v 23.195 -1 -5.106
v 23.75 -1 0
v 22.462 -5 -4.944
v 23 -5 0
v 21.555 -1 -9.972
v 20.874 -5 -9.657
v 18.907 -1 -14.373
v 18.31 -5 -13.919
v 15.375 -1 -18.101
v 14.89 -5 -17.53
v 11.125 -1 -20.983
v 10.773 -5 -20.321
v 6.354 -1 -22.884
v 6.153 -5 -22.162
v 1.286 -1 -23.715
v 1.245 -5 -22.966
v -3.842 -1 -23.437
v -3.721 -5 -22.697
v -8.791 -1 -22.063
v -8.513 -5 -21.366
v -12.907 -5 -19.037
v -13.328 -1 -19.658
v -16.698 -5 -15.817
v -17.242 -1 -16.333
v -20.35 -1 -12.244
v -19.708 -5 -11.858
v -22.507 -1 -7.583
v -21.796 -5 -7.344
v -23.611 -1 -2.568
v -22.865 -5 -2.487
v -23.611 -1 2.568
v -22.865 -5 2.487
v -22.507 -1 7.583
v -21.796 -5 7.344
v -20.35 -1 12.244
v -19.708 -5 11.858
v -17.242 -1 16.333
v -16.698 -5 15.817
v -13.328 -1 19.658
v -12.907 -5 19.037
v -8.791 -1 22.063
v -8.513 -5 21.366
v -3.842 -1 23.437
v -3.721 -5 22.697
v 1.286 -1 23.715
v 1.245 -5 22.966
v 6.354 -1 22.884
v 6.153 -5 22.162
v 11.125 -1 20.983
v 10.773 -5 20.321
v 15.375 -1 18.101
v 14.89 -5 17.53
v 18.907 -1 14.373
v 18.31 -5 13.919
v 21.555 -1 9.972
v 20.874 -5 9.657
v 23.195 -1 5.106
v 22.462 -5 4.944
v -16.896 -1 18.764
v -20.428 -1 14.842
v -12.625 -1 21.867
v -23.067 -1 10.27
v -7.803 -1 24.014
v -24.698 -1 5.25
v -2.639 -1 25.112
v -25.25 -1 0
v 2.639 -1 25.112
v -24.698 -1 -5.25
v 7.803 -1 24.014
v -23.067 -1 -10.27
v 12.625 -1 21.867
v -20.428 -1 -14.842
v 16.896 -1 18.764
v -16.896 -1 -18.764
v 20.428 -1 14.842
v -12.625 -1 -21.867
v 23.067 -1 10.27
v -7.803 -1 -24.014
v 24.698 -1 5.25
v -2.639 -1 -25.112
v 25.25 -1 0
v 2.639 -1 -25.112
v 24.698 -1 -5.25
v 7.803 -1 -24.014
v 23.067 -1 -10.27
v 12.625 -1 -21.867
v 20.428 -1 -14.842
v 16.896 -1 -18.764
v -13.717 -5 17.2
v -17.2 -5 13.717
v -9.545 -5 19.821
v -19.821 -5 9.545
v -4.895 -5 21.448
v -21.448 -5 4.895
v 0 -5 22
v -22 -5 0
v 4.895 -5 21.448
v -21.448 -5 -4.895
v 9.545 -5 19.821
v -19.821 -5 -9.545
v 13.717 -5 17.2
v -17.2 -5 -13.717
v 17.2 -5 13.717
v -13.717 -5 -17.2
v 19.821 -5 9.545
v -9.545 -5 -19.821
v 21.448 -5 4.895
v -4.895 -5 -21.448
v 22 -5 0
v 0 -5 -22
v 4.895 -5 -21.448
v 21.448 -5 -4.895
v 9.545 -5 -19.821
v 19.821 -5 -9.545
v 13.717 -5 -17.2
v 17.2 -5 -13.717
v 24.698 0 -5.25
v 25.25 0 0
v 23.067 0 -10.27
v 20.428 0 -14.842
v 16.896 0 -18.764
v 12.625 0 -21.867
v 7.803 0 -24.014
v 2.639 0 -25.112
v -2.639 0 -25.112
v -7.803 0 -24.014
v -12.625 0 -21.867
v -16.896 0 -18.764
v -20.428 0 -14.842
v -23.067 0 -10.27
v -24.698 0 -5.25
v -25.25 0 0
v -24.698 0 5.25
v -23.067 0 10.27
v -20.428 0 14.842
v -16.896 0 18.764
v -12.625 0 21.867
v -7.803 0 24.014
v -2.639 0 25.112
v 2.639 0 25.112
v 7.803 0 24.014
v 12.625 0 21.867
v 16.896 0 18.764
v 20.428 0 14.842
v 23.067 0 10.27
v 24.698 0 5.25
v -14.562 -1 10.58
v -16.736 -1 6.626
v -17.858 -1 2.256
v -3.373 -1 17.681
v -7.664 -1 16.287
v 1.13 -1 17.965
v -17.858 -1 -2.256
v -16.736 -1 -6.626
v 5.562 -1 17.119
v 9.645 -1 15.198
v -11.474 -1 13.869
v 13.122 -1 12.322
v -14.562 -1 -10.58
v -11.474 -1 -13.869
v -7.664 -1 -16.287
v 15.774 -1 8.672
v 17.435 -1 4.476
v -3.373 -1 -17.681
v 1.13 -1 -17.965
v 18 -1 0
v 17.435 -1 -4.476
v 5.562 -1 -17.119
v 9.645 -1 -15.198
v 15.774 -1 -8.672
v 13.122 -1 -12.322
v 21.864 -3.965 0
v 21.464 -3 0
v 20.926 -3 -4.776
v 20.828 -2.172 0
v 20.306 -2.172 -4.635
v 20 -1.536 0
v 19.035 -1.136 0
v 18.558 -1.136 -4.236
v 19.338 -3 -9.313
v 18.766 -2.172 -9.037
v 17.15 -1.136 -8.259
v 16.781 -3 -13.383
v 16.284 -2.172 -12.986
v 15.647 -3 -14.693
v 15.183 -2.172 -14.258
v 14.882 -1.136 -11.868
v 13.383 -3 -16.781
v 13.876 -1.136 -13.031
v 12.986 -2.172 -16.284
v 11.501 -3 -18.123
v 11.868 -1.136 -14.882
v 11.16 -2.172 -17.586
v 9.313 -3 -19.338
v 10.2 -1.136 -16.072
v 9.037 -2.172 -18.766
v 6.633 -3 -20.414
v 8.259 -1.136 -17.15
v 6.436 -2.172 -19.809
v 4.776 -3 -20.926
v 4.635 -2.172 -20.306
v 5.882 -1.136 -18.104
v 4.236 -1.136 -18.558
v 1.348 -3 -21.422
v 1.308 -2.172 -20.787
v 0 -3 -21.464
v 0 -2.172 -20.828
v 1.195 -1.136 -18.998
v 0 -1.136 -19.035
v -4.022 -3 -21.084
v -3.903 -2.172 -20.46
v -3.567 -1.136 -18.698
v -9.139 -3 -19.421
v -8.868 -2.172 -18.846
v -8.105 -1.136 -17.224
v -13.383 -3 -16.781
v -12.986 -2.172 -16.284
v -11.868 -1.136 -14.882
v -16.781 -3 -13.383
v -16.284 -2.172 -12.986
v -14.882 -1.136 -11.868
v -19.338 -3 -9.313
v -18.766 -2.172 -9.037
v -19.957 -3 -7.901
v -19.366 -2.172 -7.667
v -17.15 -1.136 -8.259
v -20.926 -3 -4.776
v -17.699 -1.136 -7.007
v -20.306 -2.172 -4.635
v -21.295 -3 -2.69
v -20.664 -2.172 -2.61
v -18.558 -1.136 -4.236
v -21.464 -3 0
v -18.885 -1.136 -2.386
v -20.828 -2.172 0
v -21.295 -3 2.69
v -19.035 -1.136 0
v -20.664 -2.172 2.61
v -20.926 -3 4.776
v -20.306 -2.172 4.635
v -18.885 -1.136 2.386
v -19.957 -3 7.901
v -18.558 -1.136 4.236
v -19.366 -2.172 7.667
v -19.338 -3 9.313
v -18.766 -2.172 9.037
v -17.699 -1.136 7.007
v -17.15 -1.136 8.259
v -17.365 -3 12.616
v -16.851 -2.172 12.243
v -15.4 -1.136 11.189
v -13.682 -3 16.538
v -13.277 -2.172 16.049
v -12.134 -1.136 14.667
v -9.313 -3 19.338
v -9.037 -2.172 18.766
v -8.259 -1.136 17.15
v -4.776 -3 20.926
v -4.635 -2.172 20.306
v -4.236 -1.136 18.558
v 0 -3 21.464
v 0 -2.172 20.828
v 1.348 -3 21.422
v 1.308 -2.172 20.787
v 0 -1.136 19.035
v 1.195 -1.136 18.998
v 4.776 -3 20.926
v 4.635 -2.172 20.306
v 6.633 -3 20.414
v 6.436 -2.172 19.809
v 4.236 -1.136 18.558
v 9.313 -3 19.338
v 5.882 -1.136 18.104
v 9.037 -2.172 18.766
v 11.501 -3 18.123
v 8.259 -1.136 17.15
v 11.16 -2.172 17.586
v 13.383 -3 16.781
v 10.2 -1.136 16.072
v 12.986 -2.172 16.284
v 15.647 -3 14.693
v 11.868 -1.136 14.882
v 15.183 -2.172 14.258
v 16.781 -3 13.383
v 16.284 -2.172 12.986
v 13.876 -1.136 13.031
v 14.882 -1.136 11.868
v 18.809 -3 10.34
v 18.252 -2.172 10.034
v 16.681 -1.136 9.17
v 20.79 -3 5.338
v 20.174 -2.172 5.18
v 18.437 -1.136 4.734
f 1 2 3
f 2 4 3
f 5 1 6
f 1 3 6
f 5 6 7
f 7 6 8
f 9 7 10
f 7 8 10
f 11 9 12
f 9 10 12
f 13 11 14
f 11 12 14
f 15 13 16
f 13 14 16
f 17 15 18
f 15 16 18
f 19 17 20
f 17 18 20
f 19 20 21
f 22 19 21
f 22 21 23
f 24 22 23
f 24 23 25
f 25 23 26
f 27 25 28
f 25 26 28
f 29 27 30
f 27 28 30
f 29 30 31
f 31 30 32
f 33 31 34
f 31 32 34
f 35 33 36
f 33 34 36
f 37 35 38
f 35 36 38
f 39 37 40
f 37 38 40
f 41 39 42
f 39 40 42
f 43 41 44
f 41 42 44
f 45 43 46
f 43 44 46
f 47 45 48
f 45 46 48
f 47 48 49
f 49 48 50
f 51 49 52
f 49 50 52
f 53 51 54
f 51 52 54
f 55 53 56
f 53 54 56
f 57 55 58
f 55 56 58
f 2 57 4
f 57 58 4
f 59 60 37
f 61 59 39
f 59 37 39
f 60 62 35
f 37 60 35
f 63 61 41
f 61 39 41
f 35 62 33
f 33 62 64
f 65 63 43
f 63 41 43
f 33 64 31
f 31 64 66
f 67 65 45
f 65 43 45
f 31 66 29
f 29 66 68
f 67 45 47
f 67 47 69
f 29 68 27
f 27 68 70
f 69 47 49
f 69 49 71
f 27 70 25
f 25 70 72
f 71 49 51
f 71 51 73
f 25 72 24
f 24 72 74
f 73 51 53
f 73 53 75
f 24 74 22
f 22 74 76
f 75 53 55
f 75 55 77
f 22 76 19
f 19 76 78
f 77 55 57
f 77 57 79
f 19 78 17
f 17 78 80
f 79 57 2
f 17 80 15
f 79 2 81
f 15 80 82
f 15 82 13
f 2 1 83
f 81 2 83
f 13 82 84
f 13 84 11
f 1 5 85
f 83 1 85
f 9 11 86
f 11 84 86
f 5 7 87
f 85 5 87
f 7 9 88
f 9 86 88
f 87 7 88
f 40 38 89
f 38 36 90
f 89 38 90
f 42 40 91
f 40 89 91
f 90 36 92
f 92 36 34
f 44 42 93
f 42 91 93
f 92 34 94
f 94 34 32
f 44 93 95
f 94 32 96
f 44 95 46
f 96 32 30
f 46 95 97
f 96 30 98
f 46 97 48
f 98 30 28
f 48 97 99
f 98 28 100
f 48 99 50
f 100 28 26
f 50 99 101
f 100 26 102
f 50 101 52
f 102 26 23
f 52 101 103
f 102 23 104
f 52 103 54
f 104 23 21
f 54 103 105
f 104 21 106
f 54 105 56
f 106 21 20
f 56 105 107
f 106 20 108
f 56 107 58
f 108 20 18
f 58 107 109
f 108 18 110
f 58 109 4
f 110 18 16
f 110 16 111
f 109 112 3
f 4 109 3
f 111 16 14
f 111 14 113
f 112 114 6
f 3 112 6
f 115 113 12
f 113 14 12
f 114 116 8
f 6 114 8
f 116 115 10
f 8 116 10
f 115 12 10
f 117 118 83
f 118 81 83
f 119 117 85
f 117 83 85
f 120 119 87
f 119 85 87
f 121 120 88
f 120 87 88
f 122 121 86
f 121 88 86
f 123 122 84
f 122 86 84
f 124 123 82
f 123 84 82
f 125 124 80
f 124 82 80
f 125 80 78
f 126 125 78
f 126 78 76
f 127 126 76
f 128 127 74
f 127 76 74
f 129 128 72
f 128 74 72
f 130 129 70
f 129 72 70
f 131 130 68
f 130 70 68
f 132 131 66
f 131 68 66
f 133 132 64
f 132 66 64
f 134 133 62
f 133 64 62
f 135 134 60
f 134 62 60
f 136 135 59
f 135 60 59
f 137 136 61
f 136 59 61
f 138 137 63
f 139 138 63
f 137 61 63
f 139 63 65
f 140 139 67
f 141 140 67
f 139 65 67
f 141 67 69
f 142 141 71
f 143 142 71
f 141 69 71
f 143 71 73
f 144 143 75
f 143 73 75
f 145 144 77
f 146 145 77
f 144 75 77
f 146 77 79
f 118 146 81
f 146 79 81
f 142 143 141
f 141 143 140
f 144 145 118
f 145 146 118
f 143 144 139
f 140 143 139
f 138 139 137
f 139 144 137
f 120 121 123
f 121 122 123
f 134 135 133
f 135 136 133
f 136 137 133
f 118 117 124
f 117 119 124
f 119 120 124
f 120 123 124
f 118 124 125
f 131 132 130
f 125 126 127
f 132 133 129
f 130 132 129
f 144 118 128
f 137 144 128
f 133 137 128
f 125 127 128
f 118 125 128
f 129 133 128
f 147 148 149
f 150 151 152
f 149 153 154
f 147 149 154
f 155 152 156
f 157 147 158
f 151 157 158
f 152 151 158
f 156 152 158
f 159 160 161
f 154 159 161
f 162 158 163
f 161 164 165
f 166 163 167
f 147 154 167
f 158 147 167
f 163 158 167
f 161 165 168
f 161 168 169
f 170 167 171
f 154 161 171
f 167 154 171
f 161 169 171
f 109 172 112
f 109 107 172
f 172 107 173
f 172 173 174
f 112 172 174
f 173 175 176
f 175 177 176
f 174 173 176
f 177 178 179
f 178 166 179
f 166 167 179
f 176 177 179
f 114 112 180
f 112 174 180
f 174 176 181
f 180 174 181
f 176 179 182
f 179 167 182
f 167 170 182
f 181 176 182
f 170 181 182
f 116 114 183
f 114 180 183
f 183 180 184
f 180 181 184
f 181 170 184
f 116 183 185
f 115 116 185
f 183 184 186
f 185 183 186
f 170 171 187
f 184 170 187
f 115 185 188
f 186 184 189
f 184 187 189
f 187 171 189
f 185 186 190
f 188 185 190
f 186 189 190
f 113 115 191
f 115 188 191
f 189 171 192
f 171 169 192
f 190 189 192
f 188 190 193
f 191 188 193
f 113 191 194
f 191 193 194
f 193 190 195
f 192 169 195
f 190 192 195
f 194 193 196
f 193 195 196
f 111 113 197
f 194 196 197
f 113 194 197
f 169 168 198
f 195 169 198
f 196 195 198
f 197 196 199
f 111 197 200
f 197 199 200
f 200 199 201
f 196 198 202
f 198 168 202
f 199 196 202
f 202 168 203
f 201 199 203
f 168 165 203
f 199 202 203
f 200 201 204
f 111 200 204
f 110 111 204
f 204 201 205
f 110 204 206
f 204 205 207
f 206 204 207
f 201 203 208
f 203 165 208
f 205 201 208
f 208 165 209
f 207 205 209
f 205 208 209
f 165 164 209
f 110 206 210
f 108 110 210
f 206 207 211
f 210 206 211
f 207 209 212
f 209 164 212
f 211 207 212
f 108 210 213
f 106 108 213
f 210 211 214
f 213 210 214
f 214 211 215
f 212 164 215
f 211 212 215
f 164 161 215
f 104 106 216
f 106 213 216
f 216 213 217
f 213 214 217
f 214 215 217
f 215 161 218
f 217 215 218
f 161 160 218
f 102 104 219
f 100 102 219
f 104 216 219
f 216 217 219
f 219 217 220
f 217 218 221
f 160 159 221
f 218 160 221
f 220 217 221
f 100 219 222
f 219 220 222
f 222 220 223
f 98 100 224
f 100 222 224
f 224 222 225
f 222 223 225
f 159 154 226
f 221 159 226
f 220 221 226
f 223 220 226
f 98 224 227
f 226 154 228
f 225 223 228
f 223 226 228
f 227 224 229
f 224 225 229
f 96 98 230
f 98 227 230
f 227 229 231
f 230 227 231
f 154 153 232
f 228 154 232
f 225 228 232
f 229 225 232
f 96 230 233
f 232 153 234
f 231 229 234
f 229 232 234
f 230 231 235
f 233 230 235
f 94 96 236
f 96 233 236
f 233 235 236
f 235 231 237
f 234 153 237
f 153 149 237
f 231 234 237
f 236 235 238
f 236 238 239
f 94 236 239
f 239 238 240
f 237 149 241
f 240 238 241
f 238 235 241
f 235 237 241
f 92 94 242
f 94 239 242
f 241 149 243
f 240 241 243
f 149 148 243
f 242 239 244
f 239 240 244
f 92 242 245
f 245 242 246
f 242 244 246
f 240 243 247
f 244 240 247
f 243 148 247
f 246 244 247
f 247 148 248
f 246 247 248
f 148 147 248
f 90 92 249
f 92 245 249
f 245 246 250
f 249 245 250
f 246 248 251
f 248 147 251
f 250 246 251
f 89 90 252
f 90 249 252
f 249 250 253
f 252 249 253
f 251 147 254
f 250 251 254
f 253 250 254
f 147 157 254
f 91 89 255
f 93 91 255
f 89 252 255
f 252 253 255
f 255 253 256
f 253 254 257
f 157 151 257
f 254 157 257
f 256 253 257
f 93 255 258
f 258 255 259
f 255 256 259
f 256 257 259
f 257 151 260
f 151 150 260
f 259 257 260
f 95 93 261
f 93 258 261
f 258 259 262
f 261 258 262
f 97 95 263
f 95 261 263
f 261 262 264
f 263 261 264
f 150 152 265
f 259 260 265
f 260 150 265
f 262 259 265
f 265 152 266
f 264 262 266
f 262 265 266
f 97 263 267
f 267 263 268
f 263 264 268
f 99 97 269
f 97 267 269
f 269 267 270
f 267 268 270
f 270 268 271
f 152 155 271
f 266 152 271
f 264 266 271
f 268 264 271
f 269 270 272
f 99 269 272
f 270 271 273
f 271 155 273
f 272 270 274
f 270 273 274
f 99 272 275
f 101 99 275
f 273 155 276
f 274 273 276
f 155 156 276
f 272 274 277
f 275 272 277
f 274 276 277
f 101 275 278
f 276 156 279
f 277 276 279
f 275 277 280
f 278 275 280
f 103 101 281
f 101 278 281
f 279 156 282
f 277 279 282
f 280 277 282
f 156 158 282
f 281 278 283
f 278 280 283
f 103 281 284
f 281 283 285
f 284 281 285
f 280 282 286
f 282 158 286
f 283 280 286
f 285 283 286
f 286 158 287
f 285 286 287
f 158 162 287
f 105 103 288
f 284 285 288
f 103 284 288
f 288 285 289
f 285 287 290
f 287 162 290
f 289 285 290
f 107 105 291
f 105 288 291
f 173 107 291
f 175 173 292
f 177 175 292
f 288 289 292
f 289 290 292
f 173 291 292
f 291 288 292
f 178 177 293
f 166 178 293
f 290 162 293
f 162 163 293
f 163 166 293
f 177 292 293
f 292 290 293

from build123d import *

# Parameters (mm, degrees)
FILLET1_R = 4


with BuildPart() as part:
    # Sketch2 → Revolve3 (revolve)
    with BuildSketch(Plane.XY):
        Polygon((22, -5), (22, -1), (0, -1), (0, 0), (25.25, 0), (25.25, -1), (23.75, -1), (23, -5), align=None)
    revolve(axis=Axis((0, -1, 0), (0, 1, 0)))

    # Fillet1
    fillet1_edges = [part.edges().sort_by_distance(p)[0] for p in [
        (-22, -1, 0),
    ]]
    fillet(fillet1_edges, radius=FILLET1_R - 0.0001)  # a hair under: the kernel refuses the full size


solid = part.part
